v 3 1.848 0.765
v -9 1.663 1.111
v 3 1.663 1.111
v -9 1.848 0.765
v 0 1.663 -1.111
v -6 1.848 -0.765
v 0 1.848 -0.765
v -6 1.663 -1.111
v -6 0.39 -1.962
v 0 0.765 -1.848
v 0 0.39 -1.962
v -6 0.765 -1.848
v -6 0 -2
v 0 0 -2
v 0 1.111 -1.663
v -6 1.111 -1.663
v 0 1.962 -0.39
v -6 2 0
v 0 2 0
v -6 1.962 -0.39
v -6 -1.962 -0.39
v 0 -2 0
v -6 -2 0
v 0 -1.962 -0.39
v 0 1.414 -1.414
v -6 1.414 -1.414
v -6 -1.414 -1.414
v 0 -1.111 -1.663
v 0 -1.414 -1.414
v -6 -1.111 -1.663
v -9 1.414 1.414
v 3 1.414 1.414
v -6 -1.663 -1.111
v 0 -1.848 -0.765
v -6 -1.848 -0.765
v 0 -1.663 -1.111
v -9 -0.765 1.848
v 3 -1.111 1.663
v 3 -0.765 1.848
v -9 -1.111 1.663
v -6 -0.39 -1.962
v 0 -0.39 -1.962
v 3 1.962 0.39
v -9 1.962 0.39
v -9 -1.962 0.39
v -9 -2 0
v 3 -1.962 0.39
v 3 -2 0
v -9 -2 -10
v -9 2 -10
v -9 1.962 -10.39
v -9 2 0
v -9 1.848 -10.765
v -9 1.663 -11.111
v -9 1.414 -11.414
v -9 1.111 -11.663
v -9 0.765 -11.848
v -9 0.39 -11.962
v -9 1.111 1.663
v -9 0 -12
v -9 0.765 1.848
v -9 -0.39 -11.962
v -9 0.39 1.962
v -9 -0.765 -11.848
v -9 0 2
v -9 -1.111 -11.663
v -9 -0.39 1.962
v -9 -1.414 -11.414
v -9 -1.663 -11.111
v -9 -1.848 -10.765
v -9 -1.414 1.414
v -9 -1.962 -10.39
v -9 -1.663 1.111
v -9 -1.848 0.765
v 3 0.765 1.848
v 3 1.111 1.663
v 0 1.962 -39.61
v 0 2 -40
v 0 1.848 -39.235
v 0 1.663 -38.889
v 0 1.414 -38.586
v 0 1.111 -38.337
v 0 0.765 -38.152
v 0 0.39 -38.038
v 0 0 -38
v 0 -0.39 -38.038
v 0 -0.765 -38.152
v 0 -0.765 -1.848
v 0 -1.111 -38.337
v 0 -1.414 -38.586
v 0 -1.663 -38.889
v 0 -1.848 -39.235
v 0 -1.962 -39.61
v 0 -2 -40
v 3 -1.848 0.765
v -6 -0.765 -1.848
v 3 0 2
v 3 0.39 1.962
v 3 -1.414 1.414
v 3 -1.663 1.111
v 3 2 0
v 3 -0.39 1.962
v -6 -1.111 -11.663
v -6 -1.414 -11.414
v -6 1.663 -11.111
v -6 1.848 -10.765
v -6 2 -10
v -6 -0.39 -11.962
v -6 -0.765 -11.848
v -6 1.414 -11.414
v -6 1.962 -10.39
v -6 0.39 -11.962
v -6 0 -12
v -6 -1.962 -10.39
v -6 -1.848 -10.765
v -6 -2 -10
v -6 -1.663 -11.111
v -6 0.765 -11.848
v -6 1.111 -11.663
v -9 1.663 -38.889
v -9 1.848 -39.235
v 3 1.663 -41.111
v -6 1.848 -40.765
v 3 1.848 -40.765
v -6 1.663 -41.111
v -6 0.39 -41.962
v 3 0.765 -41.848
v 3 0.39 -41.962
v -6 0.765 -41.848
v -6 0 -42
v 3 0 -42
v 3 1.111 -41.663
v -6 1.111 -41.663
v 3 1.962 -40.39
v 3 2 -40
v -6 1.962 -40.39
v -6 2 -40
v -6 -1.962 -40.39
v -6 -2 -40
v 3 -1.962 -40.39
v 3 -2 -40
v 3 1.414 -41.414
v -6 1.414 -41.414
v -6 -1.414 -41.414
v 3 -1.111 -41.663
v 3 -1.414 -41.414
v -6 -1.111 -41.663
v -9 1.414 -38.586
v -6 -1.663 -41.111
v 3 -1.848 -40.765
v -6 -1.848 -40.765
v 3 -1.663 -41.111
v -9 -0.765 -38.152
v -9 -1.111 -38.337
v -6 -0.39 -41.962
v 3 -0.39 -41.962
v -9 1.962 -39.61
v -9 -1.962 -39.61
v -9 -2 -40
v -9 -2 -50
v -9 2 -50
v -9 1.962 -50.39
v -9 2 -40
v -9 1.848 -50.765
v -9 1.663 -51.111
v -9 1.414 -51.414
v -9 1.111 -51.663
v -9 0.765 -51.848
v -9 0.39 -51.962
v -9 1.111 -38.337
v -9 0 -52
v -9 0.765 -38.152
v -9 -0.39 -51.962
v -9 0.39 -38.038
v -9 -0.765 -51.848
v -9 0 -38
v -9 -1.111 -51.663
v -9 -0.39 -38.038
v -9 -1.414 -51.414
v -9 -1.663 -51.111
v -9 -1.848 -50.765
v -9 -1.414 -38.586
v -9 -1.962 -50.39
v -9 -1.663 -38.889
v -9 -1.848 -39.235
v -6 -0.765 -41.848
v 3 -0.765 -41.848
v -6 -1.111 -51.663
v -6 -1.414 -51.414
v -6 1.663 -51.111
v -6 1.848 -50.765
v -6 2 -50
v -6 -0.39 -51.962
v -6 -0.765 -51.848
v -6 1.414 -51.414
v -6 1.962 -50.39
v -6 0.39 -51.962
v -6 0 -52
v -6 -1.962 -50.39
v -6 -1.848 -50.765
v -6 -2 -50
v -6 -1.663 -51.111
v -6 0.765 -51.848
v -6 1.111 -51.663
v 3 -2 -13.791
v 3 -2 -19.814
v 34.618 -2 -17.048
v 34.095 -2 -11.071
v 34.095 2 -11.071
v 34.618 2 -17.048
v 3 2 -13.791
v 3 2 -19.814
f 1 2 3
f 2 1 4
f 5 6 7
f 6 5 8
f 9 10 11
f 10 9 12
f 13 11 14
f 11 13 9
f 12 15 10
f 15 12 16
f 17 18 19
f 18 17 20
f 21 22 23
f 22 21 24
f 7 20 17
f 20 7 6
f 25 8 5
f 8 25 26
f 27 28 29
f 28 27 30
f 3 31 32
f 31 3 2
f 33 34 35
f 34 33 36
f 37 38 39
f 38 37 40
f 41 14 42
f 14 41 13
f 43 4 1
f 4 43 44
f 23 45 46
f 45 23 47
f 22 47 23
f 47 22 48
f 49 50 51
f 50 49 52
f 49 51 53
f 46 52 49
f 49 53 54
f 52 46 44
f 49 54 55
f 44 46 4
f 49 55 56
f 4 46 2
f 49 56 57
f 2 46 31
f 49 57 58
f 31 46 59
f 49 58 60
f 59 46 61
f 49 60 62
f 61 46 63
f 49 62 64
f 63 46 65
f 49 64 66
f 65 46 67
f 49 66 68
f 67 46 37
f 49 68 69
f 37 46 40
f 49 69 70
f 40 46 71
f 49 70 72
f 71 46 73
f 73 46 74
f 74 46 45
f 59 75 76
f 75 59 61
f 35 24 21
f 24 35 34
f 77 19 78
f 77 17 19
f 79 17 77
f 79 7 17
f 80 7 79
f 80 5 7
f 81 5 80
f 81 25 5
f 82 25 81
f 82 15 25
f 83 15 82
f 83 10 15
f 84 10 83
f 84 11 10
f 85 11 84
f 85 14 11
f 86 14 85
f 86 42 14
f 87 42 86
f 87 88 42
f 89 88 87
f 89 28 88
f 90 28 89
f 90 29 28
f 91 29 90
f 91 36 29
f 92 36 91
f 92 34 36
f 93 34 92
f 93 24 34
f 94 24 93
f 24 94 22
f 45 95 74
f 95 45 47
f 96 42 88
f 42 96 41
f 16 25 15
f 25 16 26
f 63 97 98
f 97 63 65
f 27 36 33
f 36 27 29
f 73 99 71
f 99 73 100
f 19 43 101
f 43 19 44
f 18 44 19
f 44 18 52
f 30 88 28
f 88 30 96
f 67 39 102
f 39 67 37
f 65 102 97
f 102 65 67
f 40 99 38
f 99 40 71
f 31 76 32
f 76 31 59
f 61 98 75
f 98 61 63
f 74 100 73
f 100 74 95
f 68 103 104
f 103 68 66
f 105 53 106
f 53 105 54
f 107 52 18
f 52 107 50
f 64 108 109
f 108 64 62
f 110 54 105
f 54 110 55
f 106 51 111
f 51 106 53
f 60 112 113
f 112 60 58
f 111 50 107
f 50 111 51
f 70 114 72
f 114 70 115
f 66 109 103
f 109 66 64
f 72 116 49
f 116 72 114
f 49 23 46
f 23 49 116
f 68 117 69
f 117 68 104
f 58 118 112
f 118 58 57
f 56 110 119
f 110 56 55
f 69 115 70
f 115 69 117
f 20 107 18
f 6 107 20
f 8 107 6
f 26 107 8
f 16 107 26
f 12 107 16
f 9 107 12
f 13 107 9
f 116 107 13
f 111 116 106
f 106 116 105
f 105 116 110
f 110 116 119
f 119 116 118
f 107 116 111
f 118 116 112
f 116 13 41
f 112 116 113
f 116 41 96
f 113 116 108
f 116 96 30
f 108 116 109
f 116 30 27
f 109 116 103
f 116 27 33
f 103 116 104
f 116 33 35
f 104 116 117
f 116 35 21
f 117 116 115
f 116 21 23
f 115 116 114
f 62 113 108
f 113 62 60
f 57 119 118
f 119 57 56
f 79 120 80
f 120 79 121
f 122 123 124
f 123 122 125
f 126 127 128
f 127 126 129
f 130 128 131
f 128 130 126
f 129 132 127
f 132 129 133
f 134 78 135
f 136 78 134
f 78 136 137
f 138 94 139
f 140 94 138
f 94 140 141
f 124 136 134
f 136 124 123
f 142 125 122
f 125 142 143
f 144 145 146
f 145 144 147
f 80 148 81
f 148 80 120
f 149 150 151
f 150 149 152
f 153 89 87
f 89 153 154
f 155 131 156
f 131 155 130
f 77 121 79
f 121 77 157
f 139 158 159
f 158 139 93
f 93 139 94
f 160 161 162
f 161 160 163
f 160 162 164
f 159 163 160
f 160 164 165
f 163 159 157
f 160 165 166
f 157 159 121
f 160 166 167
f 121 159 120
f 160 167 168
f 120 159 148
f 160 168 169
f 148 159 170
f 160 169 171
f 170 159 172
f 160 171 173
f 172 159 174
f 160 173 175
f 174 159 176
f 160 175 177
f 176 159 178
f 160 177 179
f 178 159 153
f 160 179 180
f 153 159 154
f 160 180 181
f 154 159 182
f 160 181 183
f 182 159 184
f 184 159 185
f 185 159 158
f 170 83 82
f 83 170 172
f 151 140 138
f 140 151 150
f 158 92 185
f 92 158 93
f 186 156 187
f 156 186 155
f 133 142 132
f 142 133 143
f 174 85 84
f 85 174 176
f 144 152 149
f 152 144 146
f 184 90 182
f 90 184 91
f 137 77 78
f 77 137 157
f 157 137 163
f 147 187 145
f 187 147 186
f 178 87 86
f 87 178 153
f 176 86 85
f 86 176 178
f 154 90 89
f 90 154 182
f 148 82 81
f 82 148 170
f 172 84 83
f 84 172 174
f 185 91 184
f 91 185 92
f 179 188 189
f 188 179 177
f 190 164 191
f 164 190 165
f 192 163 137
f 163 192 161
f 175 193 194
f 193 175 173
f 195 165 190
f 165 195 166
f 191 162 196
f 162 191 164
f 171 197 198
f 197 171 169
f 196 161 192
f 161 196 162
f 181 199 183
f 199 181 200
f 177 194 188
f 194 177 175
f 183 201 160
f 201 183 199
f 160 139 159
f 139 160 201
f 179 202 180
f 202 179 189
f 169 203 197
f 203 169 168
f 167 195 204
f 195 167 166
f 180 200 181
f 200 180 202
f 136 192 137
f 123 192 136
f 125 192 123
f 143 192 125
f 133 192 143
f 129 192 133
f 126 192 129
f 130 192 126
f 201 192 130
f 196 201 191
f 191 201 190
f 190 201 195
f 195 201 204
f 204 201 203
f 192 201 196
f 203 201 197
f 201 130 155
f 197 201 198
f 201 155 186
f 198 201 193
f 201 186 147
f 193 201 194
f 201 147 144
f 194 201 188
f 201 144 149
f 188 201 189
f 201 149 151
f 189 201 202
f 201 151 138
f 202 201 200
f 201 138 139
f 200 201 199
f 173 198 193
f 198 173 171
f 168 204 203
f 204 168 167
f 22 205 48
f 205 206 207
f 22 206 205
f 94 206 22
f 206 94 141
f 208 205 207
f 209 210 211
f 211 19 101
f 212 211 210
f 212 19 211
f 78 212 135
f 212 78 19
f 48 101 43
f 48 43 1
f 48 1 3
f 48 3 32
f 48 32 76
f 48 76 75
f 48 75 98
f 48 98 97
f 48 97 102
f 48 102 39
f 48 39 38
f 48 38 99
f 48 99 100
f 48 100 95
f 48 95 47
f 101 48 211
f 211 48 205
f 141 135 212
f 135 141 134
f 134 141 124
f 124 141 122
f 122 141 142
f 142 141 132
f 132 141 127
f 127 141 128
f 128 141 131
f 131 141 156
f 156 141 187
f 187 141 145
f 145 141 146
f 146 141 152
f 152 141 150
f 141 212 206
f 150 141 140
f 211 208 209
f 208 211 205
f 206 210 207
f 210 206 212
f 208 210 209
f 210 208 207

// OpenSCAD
// file: gancho.scad
module ganchos(n=1){    
    for (i=[0:1:n-1]){
        translate([0,40*i,,0]) rotate([0, 90, 0]) translate([0, 0, -9]) {
            cylinder(d = 4, h=9, $fn = 32);
            hull(){
                cylinder(d = 4, h=3, $fn = 32);
                translate([10, 0, 0]) cylinder(d = 4, h=3, $fn = 32);
            } 
        }
    }   
}

// ganchos(3);
// main file
include <gancho.scad>

module holder() {
    ganchos(1);
    translate([0,0,-40]) ganchos(1);
    rotate([0,90,0]) hull(){
        cylinder(d = 4, h=3, $fn = 32);
        translate([40, 0, 0]) cylinder(d = 4, h=3, $fn = 32);
    }  
    rotate([0,-5,0]) translate([0, -2, -20]) cube([30 + 3,4,6]);
}

holder();
